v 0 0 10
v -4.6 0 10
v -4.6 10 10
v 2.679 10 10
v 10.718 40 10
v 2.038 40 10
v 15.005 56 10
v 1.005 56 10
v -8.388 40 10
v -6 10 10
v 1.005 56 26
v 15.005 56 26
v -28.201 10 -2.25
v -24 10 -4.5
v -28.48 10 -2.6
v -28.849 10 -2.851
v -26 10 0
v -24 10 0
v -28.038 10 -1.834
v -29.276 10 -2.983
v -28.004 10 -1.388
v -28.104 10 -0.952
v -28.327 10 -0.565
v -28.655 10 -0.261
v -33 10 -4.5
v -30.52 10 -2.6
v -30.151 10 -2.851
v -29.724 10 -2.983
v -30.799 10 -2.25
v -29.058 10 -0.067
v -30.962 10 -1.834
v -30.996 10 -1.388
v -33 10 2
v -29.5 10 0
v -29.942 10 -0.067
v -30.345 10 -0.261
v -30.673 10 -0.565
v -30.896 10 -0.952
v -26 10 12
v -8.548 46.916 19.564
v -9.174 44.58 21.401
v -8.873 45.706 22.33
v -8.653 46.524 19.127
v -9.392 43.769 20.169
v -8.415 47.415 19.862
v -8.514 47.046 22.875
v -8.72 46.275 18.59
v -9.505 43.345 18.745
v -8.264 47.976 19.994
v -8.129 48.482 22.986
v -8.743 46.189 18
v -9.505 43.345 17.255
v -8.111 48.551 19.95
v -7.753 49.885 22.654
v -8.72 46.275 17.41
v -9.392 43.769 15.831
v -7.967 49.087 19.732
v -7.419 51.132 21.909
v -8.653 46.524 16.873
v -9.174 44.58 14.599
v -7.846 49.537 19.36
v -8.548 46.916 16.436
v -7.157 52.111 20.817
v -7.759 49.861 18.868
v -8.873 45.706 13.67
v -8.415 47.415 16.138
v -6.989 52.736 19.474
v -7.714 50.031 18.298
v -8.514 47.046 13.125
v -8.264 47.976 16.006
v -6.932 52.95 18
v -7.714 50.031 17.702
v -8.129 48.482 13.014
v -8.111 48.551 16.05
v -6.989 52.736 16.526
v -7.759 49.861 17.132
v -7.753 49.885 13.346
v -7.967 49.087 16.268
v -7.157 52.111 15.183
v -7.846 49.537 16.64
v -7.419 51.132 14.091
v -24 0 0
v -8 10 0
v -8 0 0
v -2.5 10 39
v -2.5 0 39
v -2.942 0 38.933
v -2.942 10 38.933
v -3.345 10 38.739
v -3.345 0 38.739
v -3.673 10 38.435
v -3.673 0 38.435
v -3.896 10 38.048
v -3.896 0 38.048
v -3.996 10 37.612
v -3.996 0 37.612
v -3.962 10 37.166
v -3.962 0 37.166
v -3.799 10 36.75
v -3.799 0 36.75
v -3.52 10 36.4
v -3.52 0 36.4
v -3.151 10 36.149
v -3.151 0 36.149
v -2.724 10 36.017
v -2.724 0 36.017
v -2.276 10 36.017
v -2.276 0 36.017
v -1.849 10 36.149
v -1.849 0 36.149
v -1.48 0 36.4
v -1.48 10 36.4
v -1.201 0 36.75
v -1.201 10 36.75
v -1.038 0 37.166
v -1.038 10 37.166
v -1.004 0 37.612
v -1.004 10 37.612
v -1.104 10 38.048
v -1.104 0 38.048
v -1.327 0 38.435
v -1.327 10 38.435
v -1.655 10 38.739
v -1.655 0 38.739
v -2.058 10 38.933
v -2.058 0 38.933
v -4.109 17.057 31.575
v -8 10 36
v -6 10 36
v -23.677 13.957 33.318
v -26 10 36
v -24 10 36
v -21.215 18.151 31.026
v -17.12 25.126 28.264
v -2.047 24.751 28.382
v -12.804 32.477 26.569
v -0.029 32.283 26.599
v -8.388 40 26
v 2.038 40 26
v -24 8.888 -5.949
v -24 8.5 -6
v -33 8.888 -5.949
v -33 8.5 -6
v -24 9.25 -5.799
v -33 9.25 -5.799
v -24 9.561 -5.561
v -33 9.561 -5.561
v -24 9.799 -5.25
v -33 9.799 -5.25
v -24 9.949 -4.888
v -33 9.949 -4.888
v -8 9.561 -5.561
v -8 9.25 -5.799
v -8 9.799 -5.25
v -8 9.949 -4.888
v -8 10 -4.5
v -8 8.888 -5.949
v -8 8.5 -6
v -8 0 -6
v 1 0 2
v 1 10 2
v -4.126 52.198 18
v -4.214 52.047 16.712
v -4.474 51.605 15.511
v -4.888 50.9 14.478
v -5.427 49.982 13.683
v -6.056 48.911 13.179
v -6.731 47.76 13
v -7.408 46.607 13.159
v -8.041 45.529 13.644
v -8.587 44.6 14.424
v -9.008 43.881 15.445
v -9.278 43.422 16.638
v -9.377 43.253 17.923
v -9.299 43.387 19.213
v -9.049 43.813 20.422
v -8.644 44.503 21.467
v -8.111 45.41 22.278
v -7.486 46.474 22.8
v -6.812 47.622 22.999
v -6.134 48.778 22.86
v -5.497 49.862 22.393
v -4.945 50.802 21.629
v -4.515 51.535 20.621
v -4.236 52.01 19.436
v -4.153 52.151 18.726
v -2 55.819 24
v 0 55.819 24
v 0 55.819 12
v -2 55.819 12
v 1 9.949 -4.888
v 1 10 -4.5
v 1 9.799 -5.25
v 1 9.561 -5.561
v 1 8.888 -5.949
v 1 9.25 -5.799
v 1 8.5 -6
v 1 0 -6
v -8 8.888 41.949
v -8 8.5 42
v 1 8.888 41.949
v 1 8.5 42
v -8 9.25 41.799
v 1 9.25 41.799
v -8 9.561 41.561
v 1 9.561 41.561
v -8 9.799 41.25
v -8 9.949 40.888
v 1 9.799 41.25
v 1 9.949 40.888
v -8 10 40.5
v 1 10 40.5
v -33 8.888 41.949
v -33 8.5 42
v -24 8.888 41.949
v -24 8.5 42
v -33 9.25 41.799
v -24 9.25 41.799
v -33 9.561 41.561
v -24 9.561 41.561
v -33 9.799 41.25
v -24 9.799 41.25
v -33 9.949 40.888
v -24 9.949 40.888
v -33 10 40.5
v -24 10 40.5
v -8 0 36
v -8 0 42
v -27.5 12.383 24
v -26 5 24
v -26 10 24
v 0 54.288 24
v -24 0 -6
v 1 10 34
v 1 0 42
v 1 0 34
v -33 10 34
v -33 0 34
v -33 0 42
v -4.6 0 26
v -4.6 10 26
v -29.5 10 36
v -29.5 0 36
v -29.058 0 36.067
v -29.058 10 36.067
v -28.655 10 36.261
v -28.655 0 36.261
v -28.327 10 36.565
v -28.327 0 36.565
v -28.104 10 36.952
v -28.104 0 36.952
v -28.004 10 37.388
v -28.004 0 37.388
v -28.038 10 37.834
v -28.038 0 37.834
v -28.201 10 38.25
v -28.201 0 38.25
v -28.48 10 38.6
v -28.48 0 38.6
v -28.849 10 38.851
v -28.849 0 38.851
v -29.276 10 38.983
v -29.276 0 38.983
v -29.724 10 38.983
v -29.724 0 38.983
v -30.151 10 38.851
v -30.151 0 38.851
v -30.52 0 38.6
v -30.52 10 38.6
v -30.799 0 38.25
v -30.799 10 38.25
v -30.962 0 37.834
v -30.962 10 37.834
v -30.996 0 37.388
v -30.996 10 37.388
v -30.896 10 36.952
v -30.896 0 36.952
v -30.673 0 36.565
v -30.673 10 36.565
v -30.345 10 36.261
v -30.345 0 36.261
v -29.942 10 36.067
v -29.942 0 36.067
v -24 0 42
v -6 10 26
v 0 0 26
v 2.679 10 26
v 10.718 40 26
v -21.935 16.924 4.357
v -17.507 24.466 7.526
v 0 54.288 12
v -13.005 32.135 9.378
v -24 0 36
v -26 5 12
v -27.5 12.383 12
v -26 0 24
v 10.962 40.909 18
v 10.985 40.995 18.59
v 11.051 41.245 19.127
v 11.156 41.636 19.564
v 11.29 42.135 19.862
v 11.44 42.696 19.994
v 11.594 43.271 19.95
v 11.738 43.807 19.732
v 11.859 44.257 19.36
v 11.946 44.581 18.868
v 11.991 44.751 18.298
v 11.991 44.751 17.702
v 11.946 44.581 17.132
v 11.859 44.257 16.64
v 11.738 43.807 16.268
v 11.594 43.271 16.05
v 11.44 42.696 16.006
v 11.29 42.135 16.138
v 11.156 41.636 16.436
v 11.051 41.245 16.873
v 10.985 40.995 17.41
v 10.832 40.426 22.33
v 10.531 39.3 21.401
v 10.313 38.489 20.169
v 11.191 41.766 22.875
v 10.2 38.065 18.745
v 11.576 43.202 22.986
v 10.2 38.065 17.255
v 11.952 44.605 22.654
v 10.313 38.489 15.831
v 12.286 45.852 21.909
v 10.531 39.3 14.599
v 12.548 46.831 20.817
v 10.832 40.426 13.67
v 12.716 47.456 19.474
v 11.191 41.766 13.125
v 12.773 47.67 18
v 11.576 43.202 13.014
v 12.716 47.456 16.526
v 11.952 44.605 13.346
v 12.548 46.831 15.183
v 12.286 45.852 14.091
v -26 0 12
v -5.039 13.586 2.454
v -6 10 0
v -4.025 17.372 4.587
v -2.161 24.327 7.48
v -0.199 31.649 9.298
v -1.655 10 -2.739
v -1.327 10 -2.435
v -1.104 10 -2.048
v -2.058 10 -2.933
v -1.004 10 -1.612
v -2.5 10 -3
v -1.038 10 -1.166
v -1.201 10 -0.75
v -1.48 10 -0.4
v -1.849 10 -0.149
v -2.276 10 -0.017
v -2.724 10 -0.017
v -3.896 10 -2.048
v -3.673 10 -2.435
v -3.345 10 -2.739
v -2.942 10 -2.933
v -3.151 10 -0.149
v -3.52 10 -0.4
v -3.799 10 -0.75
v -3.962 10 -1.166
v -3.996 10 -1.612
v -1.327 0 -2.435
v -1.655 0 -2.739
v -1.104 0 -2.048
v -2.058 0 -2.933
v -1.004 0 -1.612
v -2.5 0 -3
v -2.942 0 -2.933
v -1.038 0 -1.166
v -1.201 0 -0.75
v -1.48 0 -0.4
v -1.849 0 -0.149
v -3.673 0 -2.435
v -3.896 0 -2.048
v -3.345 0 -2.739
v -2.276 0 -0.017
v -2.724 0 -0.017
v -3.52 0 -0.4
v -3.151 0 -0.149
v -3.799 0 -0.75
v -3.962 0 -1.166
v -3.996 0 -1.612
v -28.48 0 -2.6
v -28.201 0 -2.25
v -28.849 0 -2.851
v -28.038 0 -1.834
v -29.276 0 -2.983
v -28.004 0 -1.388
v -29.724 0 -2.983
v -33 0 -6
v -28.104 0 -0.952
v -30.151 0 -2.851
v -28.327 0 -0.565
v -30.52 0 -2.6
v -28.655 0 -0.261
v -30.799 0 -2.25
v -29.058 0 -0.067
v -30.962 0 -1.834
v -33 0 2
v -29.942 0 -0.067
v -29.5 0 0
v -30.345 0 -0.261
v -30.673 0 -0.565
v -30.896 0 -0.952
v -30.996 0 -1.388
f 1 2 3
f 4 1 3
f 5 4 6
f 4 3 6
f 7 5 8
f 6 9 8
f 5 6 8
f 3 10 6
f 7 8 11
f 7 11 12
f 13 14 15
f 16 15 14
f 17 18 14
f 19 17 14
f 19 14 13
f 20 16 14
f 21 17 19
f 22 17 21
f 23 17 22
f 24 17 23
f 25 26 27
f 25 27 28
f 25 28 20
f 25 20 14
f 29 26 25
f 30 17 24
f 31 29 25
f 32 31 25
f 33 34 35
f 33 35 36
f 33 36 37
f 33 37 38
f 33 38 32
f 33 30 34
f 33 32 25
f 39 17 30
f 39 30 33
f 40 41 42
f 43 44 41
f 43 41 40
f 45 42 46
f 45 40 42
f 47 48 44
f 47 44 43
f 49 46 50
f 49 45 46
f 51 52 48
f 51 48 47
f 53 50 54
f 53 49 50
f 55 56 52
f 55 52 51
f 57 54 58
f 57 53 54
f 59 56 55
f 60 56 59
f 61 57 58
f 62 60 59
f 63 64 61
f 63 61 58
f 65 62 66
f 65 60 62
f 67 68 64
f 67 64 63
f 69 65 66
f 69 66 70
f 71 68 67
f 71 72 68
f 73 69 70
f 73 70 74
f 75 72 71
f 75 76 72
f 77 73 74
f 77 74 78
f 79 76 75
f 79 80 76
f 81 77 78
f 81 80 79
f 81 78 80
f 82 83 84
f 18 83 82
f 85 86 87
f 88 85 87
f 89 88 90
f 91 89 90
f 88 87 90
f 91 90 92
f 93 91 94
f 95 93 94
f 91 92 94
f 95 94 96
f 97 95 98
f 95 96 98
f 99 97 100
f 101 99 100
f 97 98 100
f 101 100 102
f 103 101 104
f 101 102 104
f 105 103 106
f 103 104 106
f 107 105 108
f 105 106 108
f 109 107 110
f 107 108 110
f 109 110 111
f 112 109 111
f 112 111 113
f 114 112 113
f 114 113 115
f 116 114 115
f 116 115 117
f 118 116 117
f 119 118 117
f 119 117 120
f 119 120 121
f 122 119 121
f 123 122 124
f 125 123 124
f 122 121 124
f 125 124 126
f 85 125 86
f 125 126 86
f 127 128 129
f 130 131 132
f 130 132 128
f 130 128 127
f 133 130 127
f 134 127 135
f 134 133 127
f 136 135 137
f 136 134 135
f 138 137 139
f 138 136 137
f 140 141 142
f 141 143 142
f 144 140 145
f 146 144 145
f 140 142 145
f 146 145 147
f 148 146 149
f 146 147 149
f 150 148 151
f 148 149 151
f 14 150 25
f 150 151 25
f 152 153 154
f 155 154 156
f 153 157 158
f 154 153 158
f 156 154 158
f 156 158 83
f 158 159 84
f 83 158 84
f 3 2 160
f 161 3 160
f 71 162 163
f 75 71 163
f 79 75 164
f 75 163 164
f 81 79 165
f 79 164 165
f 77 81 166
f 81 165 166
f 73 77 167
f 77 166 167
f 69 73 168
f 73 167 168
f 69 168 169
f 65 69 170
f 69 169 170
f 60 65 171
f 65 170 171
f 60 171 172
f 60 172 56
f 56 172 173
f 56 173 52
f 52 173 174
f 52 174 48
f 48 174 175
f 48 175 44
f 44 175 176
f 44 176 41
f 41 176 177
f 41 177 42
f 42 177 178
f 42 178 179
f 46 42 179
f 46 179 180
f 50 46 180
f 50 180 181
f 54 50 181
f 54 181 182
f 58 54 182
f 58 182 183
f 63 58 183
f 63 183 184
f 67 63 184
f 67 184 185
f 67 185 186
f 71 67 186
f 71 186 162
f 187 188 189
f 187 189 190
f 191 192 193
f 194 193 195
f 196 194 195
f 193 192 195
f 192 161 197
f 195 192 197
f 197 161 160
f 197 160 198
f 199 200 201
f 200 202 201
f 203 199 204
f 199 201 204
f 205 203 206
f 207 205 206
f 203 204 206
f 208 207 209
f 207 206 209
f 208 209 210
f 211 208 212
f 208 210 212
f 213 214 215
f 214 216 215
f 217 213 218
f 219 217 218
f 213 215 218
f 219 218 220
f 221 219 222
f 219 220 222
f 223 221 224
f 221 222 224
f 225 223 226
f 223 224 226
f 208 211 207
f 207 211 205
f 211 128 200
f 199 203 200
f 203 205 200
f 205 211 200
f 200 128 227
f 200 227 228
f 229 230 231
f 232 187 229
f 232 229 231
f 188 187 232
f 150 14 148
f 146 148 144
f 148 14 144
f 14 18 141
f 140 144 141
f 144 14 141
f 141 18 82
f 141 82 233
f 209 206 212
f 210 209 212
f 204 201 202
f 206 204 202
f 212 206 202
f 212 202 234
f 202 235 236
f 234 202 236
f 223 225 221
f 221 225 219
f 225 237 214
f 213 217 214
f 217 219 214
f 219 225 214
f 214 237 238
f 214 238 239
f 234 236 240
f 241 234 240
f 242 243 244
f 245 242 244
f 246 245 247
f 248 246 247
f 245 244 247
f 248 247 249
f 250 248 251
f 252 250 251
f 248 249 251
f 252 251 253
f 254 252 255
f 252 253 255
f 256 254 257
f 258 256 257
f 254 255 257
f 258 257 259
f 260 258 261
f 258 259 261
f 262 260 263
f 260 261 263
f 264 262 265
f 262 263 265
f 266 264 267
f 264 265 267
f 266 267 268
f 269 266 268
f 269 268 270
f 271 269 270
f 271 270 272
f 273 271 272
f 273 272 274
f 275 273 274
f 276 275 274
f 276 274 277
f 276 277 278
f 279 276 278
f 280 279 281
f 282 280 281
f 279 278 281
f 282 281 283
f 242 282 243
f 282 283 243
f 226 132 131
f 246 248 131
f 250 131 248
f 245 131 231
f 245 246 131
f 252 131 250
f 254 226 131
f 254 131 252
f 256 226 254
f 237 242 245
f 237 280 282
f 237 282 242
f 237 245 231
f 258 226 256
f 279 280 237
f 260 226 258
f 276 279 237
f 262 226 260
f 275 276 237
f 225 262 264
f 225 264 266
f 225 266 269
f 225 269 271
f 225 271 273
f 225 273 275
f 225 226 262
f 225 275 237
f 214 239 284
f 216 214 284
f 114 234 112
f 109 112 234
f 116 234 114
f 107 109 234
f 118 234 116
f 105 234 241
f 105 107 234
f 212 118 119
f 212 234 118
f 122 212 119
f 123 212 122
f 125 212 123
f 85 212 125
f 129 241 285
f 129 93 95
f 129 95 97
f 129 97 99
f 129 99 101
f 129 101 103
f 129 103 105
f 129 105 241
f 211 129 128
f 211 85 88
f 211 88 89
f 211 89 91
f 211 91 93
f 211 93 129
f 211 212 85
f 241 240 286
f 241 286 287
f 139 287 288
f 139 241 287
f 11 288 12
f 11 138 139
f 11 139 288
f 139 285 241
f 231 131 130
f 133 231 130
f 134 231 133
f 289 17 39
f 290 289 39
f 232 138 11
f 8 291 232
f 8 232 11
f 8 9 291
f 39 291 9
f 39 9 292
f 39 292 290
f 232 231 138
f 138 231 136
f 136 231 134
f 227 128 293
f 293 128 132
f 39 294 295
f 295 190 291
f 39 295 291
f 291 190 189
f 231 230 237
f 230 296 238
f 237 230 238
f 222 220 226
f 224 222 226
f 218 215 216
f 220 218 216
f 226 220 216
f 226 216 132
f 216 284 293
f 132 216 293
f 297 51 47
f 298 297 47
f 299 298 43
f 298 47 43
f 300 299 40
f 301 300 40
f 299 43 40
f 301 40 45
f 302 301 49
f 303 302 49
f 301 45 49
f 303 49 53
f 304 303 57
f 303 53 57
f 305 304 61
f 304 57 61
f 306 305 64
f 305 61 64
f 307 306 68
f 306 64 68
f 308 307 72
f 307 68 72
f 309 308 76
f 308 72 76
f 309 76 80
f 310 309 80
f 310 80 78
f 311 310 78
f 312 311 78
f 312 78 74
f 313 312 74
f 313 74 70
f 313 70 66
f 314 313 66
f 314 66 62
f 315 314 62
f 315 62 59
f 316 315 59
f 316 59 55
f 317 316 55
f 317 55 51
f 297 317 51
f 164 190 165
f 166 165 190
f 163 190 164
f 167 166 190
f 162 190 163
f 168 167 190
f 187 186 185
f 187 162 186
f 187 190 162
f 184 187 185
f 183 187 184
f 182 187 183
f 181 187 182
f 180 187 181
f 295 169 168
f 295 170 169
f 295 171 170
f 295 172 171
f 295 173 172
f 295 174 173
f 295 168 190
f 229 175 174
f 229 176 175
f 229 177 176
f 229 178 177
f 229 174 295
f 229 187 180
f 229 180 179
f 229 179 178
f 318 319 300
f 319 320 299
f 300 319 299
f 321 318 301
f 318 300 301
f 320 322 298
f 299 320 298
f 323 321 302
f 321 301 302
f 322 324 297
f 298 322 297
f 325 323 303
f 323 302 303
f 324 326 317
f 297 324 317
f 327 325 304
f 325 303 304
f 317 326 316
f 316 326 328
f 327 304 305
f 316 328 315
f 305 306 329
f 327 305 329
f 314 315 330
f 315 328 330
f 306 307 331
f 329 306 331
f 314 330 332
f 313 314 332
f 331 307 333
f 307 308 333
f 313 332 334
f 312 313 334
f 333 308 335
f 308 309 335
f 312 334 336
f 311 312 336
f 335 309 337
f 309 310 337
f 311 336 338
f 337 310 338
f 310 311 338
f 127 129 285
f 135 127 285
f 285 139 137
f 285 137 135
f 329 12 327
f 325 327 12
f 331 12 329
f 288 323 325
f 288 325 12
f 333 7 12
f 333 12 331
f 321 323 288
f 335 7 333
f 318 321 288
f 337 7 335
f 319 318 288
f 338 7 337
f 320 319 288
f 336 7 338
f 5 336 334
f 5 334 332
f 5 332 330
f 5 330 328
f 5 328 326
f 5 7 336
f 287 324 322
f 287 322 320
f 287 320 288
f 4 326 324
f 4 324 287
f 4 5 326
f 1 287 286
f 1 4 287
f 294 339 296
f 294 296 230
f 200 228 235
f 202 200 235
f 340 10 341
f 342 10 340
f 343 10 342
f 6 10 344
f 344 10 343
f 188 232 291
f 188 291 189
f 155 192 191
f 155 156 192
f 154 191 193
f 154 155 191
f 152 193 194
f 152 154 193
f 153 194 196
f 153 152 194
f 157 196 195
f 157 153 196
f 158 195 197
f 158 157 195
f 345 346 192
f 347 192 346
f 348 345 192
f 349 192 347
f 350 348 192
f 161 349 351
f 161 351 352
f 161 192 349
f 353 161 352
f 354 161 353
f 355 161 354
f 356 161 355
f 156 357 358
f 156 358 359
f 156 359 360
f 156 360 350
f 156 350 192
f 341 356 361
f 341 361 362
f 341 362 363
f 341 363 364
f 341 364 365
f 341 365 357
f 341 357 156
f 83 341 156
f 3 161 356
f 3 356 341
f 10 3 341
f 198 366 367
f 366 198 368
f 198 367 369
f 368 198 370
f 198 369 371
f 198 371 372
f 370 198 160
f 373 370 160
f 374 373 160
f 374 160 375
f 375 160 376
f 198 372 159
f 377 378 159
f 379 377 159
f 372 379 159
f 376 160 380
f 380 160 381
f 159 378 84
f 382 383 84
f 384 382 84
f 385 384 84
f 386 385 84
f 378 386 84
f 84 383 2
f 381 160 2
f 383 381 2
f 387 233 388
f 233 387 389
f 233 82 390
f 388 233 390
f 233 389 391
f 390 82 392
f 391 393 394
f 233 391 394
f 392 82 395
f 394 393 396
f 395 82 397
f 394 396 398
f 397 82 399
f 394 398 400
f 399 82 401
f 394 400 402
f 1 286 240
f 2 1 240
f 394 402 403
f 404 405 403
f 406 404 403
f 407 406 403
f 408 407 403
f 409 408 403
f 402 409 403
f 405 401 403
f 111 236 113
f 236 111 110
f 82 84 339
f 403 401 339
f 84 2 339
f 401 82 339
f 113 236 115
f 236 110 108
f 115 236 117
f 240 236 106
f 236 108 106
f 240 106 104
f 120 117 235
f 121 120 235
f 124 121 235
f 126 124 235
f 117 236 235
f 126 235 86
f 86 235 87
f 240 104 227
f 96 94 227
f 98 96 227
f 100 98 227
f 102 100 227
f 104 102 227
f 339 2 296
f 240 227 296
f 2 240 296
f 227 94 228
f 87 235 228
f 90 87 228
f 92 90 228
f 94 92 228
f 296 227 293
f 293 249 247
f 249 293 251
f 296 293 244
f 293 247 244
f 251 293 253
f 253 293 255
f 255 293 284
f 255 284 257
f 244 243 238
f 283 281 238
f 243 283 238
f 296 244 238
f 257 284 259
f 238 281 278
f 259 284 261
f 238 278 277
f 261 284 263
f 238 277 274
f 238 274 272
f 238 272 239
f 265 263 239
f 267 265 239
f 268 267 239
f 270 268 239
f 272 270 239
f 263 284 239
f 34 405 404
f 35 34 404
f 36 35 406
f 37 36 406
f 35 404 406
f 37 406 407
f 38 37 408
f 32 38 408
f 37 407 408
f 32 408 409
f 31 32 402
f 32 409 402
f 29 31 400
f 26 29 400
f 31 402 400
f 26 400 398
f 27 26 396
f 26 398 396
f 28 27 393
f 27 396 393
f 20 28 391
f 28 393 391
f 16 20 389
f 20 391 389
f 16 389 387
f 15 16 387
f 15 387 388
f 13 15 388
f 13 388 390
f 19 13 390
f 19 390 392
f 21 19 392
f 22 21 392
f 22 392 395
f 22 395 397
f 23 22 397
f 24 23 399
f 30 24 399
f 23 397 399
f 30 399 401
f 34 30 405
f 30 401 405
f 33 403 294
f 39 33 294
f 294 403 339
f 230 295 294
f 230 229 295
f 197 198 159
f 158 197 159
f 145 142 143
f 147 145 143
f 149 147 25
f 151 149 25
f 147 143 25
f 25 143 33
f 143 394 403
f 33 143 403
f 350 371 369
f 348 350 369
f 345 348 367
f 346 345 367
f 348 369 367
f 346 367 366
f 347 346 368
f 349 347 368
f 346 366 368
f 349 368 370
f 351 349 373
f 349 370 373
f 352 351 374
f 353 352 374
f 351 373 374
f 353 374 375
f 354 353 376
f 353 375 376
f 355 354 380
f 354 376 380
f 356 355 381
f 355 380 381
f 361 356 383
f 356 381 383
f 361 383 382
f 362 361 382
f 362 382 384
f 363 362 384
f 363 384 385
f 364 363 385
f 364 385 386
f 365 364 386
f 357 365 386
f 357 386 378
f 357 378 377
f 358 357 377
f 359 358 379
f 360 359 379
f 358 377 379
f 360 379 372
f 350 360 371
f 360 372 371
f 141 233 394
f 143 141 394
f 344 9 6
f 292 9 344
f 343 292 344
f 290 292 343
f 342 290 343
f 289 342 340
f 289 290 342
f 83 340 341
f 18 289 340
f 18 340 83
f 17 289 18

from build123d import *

# Parameters (mm, degrees)
BOSS_EXTRUDE1_DEPTH = 36
CUT_EXTRUDE1_REACH  = 77.774
SKETCH5_W           = 10
SKETCH5_H           = 10
CUT_EXTRUDE4_DEPTH  = 70.808427336
SKETCH6_W           = 10
SKETCH6_H           = 49.869122111
CUT_EXTRUDE5_DEPTH  = 8.383745
SKETCH7_R           = 1.5
BOSS_EXTRUDE2_DEPTH = 10
BOSS_EXTRUDE3_DEPTH = 6
SKETCH9_R           = 5
BOSS_EXTRUDE4_DEPTH = 20.4
CUT_EXTRUDE7_REACH  = 76.44
SKETCH12_R          = 2
FILLET1_R           = 1.5


with BuildPart() as part:
    # Sketch1 → Boss-Extrude1 (new body)
    with BuildSketch(Plane.XY):
        Polygon((0, 0), (-26, 0), (-26, 10), (1.005154776, 56), (15.005154776, 56), align=None)
    extrude(amount=BOSS_EXTRUDE1_DEPTH)

    # Sketch2 → Cut-Extrude1 (cut, up to next)
    with BuildSketch(Plane(origin=(-26, 3.422964937, 0), x_dir=(0, 0, -1), z_dir=(1, 0, 0)), mode=Mode.PRIVATE) as cut_extrude1_sk1:
        with BuildLine():
            Line((-26, 36.577035063), (-26, 52.577035063))
            Line((-26, 52.577035063), (-36, 52.577035063))
            Line((-36, 52.577035063), (-36, 6.577035063))
            ThreePointArc((-36, 6.577035063), (-28.565835097, 20.765646762), (-26, 36.577035063))
        make_face()
    cut_extrude1_tool1 = extrude(cut_extrude1_sk1.sketch, amount=CUT_EXTRUDE1_REACH, mode=Mode.PRIVATE) & part.part
    # Sketch2 → Cut-Extrude1 (cut, up to next)
    with BuildSketch(Plane(origin=(-26, 3.422964937, 0), x_dir=(0, 0, -1), z_dir=(1, 0, 0)), mode=Mode.PRIVATE) as cut_extrude1_sk2:
        with BuildLine():
            ThreePointArc((-10, 36.577035063), (-7.434164903, 20.765646762), (0, 6.577035063))
            Line((0, 6.577035063), (0, 52.577035063))
            Line((0, 52.577035063), (-10, 52.577035063))
            Line((-10, 52.577035063), (-10, 36.577035063))
        make_face()
    cut_extrude1_tool2 = extrude(cut_extrude1_sk2.sketch, amount=CUT_EXTRUDE1_REACH, mode=Mode.PRIVATE) & part.part
    # Sketch2 → Cut-Extrude1 (cut, up to next)
    with BuildSketch(Plane(origin=(-26, 3.422964937, 0), x_dir=(0, 0, -1), z_dir=(1, 0, 0)), mode=Mode.PRIVATE) as cut_extrude1_sk3:
        with BuildLine():
            ThreePointArc((-36, 6.577035063), (-28.565835097, 20.765646762), (-26, 36.577035063))
            Line((-26, 36.577035063), (-26, 52.577035063))
            Line((-26, 52.577035063), (-36, 52.577035063))
            Line((-36, 52.577035063), (-36, 6.577035063))
        make_face()
    cut_extrude1_tool3 = extrude(cut_extrude1_sk3.sketch, amount=CUT_EXTRUDE1_REACH, mode=Mode.PRIVATE) & part.part
    # Sketch2 → Cut-Extrude1 (cut, up to next)
    with BuildSketch(Plane(origin=(-26, 3.422964937, 0), x_dir=(0, 0, -1), z_dir=(1, 0, 0)), mode=Mode.PRIVATE) as cut_extrude1_sk4:
        with BuildLine():
            Line((0, 6.577035063), (0, 52.577035063))
            Line((0, 52.577035063), (-10, 52.577035063))
            Line((-10, 52.577035063), (-10, 36.577035063))
            ThreePointArc((-10, 36.577035063), (-7.434164903, 20.765646762), (0, 6.577035063))
        make_face()
    cut_extrude1_tool4 = extrude(cut_extrude1_sk4.sketch, amount=CUT_EXTRUDE1_REACH, mode=Mode.PRIVATE) & part.part
    add(cut_extrude1_tool1.solids().sort_by_distance((-26, 37.109216, 31.540478))[0], mode=Mode.SUBTRACT)
    add(cut_extrude1_tool2.solids().sort_by_distance((-26, 37.109216, 4.459522))[0], mode=Mode.SUBTRACT)
    add(cut_extrude1_tool3.solids().sort_by_distance((-26, 37.109216, 31.540478))[0], mode=Mode.SUBTRACT)
    add(cut_extrude1_tool4.solids().sort_by_distance((-26, 37.109216, 4.459522))[0], mode=Mode.SUBTRACT)

    # Sketch5 → Cut-Extrude4 (cut, through all)
    with BuildSketch(Plane.ZY.offset(6)):
        with Locations((31, 5)):
            Rectangle(SKETCH5_W, SKETCH5_H)
        with Locations((5, 5)):
            Rectangle(SKETCH5_W, SKETCH5_H)
    extrude(amount=-CUT_EXTRUDE4_DEPTH, mode=Mode.SUBTRACT)

    # Sketch6 → Cut-Extrude5 (cut)
    with BuildSketch(Plane(origin=(0, 0, 0), x_dir=(0, 0, -1), z_dir=(0.9659258262890674, -0.2588190451025246, 0))):
        with Locations((-31, 33.040905048)):
            Rectangle(SKETCH6_W, SKETCH6_H)
        with Locations((-5, 33.040905048)):
            Rectangle(SKETCH6_W, SKETCH6_H)
    extrude(amount=-CUT_EXTRUDE5_DEPTH, mode=Mode.SUBTRACT)

    # Sketch7 → Boss-Extrude2 (add)
    with BuildSketch(Plane.XZ):
        Polygon((-26, 24), (-33, 34), (-33, 42), (-24, 42), (-24, 36), (-26, 36), align=None)
        with Locations(Location((-29.5, 37.5, 0), (0, 0, 270))):
            Circle(SKETCH7_R, mode=Mode.SUBTRACT)
        Polygon((-26, 0), (-24, 0), (-24, -6), (-33, -6), (-33, 2), (-26, 12), align=None)
        with Locations(Location((-29.5, -1.5, 0), (0, 0, 90))):
            Circle(SKETCH7_R, mode=Mode.SUBTRACT)
        Polygon((-6, 12), (1, 2), (1, -6), (-8, -6), (-8, 0), (-6, 0), align=None)
        with Locations(Location((-2.5, -1.5, 0), (0, 0, 270))):
            Circle(SKETCH7_R, mode=Mode.SUBTRACT)
        Polygon((-6, 36), (-8, 36), (-8, 42), (1, 42), (1, 34), (-6, 24), align=None)
        with Locations(Location((-2.5, 37.5, 0), (0, 0, 90))):
            Circle(SKETCH7_R, mode=Mode.SUBTRACT)
    extrude(amount=-BOSS_EXTRUDE2_DEPTH)

    # Sketch8 → Boss-Extrude3 (add, symmetric)
    with BuildSketch(Plane.XY.offset(18)):
        Polygon((-26, 5), (-26, 10), (0, 54.287840966), (0, 55.819136666), (-2, 55.819136666), (-27.5, 12.382984949), align=None)
    extrude(amount=BOSS_EXTRUDE3_DEPTH, both=True)

    # Sketch9 → Boss-Extrude4 (add)
    with BuildSketch(Plane(origin=(0, 0, 0), x_dir=(0, 0, -1), z_dir=(-0.9659258262890674, 0.2588190451025246, 0))):
        with Locations(Location((-18, -44.351999472, 0), (0, 0, 270))):
            Circle(SKETCH9_R)
    extrude(amount=BOSS_EXTRUDE4_DEPTH)

    # Sketch12 → Cut-Extrude7 (cut, up to next)
    with BuildSketch(Plane(origin=(-19.704886856, 5.27990852, 0), x_dir=(0, 0, 1), z_dir=(-0.9659258262890673, 0.2588190451025247, 0)), mode=Mode.PRIVATE) as cut_extrude7_sk1:
        with Locations(Location((18, 44.351999472, 0), (0, 0, 270))):
            Circle(SKETCH12_R)
    cut_extrude7_tool1 = extrude(cut_extrude7_sk1.sketch, amount=-CUT_EXTRUDE7_REACH, mode=Mode.PRIVATE) & part.part
    add(cut_extrude7_tool1.solids().sort_by_distance((-8.225745, 48.12065, 18))[0], mode=Mode.SUBTRACT)

    # Fillet1
    fillet1_edges = [part.edges().sort_by_distance(p)[0] for p in [
        (-28.5, 10, 42),
        (-28.5, 10, -6),
        (-3.5, 10, -6),
        (-3.5, 10, 42),
    ]]
    fillet(fillet1_edges, radius=FILLET1_R)


solid = part.part
